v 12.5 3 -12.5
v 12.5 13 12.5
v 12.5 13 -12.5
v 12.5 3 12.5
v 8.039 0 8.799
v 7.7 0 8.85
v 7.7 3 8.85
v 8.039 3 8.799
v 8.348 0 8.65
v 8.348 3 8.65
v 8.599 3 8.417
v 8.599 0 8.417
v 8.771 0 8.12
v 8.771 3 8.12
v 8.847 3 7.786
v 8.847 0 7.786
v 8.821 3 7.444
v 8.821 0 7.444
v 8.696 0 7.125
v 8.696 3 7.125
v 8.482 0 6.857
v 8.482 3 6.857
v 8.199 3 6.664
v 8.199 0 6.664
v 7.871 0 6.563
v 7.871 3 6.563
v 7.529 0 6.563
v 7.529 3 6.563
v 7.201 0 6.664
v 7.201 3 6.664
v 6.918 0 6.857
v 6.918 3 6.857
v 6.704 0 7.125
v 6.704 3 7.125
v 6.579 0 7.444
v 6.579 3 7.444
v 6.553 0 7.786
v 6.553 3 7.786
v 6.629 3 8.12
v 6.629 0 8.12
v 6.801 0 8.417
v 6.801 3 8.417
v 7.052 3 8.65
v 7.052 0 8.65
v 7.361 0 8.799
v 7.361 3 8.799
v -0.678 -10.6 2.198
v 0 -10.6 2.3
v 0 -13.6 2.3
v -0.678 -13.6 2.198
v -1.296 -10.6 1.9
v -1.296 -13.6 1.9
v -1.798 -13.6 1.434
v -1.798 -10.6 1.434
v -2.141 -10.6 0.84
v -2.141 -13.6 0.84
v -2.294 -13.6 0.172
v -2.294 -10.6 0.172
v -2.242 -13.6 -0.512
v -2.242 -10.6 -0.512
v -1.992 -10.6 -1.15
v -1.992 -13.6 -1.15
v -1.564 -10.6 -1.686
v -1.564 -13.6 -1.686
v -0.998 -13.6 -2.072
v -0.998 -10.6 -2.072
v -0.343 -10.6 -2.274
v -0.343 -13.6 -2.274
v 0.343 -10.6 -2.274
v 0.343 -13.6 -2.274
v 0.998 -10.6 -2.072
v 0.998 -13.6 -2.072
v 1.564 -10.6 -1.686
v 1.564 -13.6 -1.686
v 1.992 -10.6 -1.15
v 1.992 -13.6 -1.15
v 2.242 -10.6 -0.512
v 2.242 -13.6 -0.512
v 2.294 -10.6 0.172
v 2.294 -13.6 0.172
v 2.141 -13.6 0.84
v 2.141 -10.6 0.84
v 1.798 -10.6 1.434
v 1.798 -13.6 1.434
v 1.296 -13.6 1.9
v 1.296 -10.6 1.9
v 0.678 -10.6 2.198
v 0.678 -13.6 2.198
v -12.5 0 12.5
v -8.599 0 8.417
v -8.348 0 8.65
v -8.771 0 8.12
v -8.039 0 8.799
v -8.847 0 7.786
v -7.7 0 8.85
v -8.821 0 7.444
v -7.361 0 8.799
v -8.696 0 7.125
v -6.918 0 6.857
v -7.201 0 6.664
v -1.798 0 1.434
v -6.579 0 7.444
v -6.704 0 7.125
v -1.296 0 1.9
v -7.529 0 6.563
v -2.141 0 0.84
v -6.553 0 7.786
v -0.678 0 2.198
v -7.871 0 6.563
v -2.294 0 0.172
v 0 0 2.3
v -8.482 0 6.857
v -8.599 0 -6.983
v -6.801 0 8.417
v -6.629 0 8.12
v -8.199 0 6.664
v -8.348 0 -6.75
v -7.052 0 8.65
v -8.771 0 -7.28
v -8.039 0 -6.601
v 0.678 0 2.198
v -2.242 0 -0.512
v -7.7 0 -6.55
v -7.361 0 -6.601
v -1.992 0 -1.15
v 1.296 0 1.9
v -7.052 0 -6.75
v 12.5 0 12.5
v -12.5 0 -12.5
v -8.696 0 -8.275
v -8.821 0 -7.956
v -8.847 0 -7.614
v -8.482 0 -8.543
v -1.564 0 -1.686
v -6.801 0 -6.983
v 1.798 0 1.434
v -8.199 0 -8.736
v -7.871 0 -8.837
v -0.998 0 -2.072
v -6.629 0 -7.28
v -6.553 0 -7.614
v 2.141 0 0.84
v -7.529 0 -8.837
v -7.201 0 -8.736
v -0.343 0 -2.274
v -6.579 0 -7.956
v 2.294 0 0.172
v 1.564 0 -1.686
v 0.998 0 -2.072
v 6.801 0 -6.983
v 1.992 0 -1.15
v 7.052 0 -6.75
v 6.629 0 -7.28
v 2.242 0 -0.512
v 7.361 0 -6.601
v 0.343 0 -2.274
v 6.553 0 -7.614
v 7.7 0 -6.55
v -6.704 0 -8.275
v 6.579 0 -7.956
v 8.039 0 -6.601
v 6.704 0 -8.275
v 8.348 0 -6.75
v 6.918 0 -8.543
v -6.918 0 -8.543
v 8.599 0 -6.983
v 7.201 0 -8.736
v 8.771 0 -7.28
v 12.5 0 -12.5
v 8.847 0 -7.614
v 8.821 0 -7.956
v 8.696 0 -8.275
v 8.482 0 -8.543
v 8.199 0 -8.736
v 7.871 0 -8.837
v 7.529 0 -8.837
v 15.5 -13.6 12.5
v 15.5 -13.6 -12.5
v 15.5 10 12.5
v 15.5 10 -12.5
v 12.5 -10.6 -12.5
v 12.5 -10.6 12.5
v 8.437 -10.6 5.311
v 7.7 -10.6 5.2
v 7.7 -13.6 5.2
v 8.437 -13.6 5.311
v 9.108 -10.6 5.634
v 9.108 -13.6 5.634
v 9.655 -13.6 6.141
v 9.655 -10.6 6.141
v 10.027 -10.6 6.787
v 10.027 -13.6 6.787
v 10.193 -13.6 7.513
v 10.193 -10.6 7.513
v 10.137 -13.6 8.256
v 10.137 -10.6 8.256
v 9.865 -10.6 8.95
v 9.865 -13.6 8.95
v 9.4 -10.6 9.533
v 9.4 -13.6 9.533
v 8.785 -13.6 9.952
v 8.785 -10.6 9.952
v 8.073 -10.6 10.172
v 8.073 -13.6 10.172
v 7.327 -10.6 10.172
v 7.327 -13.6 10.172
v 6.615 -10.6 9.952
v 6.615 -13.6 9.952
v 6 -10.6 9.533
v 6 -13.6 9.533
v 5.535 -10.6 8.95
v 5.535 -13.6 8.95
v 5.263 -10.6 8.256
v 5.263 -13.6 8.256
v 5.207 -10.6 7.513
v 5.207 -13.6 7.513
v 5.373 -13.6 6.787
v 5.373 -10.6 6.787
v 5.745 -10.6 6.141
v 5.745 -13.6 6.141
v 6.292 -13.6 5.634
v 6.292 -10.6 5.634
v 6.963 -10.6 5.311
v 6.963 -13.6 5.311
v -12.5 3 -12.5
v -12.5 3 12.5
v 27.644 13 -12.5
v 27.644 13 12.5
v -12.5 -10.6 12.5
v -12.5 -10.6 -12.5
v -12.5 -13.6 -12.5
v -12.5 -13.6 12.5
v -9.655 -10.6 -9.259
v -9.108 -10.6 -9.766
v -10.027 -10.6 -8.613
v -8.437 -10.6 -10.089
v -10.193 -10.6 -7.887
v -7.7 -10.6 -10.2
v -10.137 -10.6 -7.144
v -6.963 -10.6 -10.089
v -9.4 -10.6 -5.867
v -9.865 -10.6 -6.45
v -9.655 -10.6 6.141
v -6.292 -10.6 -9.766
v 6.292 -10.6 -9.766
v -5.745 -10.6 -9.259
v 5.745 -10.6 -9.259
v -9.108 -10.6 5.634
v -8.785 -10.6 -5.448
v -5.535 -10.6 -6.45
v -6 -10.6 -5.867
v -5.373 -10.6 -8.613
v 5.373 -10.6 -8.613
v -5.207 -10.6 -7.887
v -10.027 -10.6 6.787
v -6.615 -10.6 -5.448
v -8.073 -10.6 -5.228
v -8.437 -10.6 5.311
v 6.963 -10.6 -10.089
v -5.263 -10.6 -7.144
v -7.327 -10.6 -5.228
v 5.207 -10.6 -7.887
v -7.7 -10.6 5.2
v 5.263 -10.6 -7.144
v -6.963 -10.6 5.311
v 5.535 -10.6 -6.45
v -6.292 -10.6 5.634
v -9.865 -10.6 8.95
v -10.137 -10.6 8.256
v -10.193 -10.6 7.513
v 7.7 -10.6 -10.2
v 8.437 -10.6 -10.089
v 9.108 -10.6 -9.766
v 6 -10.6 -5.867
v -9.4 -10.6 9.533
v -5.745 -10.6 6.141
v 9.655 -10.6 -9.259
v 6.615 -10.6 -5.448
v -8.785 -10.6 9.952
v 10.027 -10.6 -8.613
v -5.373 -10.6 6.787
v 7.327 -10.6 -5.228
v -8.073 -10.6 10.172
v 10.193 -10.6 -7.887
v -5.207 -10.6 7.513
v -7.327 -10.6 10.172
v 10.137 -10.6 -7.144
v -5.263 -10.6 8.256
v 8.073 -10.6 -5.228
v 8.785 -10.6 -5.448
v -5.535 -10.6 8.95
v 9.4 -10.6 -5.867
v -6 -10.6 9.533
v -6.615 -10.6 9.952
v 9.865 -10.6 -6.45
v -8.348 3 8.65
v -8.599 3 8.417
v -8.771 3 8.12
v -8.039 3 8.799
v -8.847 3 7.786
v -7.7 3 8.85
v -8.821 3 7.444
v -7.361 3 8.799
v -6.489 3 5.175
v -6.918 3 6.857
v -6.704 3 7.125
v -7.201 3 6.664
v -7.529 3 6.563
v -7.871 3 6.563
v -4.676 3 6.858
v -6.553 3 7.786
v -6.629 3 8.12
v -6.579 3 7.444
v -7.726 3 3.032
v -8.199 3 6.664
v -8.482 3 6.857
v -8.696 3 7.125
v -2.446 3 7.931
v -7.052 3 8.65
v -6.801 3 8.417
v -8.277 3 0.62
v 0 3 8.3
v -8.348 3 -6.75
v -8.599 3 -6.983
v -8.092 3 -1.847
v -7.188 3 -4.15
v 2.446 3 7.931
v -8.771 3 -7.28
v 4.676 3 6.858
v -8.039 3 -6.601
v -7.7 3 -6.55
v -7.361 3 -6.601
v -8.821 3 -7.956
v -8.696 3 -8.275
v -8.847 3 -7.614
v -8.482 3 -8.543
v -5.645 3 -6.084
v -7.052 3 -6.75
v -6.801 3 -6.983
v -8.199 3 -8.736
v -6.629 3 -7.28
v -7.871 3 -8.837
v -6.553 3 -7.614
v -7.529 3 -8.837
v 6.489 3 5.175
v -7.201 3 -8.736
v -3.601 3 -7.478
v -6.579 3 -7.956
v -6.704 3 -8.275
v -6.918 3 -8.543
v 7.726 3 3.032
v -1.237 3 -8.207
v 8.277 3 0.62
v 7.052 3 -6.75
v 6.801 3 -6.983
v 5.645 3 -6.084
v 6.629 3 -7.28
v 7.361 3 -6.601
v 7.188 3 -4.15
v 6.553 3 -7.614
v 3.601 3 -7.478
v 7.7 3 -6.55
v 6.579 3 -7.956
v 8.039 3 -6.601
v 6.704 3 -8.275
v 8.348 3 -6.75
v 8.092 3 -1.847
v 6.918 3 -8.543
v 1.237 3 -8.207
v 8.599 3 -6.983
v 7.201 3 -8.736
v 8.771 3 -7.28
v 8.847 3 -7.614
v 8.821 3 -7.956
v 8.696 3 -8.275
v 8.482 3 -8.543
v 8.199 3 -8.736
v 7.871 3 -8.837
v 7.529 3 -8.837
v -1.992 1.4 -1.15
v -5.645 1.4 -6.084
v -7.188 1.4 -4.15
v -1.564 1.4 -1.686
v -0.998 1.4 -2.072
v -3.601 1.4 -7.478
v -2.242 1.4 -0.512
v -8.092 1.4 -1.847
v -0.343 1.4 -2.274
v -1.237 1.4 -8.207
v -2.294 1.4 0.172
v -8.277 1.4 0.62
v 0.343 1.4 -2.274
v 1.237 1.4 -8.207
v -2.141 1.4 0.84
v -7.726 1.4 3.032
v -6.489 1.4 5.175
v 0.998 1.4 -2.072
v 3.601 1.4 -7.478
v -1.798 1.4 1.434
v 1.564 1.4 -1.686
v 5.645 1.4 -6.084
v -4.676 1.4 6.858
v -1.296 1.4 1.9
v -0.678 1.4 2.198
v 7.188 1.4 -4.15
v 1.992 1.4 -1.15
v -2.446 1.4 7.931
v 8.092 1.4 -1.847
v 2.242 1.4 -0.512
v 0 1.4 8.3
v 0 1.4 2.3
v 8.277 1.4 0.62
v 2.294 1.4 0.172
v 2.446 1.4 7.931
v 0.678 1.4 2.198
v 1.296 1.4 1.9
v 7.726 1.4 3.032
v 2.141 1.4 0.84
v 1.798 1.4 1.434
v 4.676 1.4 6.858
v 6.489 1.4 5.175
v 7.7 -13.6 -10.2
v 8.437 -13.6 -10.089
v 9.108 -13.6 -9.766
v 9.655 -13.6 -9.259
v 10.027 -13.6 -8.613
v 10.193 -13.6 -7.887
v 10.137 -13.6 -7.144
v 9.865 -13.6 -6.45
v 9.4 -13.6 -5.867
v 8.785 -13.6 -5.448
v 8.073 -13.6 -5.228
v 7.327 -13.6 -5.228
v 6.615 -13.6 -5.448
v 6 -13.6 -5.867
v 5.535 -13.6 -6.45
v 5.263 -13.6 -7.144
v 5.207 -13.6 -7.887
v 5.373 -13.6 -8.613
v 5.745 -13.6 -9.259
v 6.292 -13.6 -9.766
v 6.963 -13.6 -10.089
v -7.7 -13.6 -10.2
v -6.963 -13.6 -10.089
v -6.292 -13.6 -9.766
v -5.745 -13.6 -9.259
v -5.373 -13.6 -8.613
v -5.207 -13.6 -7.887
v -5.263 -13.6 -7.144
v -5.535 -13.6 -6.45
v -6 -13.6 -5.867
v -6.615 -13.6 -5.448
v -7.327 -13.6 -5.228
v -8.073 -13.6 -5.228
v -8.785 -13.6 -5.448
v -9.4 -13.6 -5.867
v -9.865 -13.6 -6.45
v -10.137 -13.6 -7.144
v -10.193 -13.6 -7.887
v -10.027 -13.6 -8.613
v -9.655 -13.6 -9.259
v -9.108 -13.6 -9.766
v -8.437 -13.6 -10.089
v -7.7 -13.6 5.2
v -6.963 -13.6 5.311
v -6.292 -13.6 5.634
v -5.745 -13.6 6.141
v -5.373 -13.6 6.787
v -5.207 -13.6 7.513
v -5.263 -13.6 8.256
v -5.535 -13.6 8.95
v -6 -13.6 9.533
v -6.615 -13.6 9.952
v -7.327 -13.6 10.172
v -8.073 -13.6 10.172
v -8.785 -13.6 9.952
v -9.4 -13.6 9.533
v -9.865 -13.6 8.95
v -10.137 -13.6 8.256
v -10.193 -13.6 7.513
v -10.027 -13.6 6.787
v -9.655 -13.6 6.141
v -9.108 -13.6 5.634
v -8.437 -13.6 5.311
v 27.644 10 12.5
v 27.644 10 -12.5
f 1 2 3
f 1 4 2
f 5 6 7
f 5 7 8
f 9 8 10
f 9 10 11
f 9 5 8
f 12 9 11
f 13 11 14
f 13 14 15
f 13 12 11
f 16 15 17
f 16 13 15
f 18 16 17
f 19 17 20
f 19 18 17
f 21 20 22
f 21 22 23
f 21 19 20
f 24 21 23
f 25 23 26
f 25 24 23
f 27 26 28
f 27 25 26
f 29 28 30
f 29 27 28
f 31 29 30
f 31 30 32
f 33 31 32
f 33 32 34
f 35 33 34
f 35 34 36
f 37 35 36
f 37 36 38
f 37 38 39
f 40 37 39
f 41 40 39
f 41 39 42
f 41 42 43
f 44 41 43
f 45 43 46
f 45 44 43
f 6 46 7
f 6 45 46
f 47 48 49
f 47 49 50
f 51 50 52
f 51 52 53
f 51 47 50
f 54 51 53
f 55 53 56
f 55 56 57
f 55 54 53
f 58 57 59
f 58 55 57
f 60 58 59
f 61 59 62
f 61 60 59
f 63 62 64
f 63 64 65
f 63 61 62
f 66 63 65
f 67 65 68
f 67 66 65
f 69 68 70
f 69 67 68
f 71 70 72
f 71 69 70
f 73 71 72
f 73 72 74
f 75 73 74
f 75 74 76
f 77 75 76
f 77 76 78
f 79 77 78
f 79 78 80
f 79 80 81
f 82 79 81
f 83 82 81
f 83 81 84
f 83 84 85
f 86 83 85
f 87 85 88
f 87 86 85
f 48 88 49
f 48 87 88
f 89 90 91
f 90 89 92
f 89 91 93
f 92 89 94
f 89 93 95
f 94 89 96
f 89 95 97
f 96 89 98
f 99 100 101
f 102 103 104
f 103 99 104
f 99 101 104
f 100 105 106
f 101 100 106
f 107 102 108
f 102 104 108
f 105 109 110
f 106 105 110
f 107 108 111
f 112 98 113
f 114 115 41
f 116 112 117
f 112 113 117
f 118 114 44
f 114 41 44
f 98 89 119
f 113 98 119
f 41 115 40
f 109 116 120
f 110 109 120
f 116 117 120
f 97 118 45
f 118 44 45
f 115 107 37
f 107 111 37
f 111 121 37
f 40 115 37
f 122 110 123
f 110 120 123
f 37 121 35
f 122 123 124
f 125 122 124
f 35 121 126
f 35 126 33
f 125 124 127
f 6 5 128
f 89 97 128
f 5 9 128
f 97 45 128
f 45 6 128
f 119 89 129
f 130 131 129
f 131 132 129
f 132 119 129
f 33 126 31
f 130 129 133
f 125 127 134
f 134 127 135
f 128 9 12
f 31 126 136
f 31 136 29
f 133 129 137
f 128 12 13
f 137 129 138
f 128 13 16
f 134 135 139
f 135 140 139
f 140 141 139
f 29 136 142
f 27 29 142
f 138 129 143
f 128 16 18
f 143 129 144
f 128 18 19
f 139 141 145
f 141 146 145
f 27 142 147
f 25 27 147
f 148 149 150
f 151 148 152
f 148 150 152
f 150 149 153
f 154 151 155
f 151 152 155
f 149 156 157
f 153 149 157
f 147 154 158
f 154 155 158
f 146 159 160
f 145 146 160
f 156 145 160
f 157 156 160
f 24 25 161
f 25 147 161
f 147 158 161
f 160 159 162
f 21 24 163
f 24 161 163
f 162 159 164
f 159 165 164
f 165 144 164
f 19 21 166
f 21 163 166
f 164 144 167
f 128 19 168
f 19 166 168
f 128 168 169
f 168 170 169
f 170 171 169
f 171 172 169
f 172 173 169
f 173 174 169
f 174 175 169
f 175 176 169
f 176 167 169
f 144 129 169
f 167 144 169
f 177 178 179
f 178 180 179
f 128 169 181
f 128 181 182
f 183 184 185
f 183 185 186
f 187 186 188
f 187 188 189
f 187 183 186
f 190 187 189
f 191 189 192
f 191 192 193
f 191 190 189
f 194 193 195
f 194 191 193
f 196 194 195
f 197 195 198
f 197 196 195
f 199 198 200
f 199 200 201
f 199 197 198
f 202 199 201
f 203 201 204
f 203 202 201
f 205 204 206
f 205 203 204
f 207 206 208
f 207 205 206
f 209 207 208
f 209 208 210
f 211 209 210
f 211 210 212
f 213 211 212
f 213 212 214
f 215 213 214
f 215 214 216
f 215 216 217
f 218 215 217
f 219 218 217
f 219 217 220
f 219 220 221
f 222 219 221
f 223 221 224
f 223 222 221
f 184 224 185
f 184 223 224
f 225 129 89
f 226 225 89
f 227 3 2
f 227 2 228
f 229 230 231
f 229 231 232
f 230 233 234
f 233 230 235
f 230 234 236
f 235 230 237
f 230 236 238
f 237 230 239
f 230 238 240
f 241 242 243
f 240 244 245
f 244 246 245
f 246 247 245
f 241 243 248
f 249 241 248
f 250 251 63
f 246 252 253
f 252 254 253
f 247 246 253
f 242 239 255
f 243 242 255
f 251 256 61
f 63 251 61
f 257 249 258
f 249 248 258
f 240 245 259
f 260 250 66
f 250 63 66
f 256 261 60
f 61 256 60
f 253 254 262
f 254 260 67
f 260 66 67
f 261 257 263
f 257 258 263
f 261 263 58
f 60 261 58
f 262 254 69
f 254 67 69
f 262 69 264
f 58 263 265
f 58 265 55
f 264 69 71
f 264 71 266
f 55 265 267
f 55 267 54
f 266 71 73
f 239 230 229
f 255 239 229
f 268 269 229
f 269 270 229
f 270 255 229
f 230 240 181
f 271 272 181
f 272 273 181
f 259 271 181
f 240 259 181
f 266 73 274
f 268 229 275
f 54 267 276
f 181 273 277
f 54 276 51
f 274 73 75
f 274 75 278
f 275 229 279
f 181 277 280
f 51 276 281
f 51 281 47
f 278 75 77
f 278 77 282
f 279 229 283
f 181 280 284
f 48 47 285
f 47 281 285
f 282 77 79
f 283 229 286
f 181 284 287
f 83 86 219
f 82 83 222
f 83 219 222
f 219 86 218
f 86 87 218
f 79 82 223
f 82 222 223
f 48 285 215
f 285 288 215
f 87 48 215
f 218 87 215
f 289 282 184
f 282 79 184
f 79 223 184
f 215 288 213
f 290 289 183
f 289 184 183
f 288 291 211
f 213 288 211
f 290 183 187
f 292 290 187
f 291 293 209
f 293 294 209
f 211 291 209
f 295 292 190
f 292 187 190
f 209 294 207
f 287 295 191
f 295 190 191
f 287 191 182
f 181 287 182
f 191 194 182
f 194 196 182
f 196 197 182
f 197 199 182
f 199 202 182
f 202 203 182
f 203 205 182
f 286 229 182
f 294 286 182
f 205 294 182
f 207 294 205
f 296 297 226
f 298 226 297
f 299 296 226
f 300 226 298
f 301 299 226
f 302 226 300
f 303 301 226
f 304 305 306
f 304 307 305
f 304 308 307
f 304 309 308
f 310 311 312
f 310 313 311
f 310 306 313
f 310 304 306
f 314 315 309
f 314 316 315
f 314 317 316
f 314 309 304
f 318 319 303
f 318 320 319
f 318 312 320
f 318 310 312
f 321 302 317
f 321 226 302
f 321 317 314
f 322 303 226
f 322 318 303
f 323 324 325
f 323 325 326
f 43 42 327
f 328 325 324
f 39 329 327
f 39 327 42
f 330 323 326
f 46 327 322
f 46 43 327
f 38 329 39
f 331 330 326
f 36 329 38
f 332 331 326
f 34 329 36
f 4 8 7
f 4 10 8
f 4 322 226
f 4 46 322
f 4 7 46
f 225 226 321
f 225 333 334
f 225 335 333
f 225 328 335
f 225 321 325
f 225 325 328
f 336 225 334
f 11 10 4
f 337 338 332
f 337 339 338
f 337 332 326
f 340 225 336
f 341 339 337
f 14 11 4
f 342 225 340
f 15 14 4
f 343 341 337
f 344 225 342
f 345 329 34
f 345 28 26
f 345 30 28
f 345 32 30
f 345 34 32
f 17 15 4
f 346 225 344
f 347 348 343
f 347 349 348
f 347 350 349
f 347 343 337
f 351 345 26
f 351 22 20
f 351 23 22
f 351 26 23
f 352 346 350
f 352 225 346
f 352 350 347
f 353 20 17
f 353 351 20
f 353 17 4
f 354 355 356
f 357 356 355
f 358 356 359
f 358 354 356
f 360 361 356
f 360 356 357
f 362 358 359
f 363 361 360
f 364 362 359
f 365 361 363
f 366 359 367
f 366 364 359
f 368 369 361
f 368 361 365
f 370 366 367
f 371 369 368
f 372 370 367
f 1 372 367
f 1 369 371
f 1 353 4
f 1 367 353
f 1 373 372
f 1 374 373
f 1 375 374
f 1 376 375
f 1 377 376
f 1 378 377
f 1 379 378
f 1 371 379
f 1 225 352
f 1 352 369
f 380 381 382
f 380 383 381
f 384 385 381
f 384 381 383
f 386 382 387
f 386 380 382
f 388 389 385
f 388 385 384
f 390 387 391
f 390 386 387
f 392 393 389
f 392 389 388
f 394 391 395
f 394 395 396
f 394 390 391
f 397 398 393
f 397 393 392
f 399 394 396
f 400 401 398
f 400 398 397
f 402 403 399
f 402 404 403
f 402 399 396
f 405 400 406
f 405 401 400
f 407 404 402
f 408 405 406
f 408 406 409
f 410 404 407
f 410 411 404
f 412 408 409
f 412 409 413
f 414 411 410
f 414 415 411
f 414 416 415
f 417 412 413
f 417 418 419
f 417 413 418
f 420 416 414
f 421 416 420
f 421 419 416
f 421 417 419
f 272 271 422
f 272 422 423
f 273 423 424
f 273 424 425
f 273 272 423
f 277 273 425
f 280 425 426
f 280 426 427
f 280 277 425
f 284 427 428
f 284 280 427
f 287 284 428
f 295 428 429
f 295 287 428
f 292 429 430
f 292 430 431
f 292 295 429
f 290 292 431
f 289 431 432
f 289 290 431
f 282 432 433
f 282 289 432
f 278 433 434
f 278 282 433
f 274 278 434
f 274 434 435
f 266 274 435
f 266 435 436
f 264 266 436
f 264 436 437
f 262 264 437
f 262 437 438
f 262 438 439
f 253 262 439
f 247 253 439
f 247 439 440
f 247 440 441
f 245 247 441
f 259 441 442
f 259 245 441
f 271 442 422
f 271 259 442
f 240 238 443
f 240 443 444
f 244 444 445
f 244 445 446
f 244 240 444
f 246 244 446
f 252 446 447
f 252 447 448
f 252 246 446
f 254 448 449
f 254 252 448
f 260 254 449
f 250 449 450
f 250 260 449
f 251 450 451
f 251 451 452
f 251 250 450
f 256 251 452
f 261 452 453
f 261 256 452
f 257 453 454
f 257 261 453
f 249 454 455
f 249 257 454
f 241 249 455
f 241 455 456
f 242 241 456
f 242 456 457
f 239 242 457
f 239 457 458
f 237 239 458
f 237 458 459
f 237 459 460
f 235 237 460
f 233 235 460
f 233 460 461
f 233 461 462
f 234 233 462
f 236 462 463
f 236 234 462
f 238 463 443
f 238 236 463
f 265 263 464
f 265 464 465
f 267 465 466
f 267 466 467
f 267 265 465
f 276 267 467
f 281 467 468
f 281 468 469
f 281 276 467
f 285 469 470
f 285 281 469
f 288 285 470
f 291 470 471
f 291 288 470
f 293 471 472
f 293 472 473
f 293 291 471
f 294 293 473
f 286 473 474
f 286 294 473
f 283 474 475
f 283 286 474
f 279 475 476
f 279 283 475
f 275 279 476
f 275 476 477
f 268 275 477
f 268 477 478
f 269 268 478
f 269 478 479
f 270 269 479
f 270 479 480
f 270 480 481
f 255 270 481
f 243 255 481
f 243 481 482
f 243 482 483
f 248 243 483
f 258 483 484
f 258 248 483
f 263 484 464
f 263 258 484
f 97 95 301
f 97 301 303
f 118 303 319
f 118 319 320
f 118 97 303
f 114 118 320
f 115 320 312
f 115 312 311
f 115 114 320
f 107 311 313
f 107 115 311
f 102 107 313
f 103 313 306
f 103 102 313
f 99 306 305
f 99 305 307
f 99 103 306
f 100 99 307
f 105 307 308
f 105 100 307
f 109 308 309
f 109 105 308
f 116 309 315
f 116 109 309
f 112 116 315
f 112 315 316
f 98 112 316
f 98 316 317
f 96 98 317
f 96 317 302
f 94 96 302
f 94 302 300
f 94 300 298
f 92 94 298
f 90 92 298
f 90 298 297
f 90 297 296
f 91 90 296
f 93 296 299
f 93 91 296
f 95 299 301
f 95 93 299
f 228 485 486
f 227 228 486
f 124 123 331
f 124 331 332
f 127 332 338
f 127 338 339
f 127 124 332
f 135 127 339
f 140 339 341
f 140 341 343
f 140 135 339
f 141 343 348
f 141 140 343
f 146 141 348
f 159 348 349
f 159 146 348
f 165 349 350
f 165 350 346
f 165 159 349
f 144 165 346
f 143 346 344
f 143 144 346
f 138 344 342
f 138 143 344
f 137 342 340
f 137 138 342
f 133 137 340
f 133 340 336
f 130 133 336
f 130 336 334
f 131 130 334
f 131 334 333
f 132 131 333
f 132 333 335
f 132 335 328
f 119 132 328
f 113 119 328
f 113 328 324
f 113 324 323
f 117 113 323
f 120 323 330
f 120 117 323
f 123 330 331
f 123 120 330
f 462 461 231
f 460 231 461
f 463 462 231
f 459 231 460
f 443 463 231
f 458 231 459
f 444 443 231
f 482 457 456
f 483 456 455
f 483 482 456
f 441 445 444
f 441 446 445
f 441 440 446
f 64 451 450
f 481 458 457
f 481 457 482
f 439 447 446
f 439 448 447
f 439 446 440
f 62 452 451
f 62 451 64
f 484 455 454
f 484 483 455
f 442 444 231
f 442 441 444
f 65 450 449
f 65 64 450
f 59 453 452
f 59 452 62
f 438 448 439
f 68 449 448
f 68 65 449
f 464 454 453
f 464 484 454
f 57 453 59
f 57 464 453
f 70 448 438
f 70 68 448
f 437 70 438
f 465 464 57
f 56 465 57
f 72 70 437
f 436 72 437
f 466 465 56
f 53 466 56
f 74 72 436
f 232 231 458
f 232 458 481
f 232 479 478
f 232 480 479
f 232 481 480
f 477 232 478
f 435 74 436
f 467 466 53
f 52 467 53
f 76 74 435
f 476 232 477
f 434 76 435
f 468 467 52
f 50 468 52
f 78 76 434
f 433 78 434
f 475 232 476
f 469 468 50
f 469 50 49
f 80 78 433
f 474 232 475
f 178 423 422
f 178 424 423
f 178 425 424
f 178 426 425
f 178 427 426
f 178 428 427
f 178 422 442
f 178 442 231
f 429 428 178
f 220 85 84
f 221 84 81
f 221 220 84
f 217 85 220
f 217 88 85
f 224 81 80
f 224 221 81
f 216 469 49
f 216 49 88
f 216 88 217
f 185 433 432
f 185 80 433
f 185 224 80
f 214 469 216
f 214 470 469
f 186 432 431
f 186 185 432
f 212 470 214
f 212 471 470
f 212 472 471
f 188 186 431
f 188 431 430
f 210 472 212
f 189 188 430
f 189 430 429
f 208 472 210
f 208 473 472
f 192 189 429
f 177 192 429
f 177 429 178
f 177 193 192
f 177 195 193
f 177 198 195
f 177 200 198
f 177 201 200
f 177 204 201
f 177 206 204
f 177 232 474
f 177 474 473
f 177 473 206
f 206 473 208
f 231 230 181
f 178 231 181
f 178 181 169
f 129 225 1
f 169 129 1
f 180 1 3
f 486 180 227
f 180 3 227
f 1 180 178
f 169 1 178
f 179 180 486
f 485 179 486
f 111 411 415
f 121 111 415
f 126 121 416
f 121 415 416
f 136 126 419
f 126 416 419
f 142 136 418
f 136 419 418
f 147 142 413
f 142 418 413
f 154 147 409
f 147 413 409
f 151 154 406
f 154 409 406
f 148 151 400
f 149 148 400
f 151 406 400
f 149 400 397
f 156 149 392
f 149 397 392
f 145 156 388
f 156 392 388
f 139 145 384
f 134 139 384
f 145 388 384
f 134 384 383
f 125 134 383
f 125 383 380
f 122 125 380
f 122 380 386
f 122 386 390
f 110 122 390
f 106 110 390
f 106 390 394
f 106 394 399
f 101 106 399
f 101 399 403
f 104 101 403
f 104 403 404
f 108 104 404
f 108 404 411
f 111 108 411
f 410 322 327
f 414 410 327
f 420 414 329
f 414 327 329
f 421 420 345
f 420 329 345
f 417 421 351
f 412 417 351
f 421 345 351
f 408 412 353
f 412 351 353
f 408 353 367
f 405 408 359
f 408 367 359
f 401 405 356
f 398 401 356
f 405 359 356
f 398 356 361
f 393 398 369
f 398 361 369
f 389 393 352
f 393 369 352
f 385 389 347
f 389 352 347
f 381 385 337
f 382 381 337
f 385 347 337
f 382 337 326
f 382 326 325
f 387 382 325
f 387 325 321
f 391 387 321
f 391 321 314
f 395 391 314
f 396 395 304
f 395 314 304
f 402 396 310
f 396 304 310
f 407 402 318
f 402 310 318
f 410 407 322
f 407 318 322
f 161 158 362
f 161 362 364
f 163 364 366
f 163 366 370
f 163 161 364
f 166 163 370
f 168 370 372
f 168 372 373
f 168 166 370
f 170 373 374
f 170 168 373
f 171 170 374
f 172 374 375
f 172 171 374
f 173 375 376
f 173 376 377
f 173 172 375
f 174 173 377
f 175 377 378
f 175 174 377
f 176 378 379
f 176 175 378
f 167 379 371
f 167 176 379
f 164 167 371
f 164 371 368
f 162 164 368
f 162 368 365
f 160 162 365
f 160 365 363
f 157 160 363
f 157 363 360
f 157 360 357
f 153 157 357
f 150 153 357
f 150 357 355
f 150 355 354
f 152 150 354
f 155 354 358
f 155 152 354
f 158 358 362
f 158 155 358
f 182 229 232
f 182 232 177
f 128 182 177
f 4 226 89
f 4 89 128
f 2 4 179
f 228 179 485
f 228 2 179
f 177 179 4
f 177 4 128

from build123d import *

# Parameters (mm, degrees)
SKETCH1_R           = 1.15
BOSS_EXTRUDE1_DEPTH = 3
SKETCH2_W           = 3
SKETCH2_H           = 25
BOSS_EXTRUDE2_DEPTH = 7
SKETCH3_W           = 15.143900966
SKETCH3_H           = 25
BOSS_EXTRUDE3_DEPTH = 3
SKETCH4_R           = 8.3
CUT_EXTRUDE1_DEPTH  = 1.6
SKETCH5_R           = 2.3
CUT_EXTRUDE2_DEPTH  = 33.480690581
SKETCH6_W           = 3
SKETCH6_H           = 25
BOSS_EXTRUDE4_DEPTH = 10.6
SKETCH7_W           = 28
SKETCH7_H           = 25
SKETCH7_R           = 2.3
SKETCH7_R_2         = 2.5
BOSS_EXTRUDE5_DEPTH = 3


with BuildPart() as part:
    # Sketch1 → Boss-Extrude1 (new body)
    with BuildSketch(Plane(origin=(0, 0, 0), x_dir=(1, 0, 0), z_dir=(0, 1, 0))):
        Polygon((12.5, 12.5), (-12.5, 12.5), (-12.5, -12.5), (12.5, -12.5), (15.5, -12.5), (15.5, 12.5), align=None)
        with Locations(Location((-7.7, 7.7, 0), (0, 0, 270))):
            Circle(SKETCH1_R, mode=Mode.SUBTRACT)
        with Locations(Location((-7.7, -7.7, 0), (0, 0, 270))):
            Circle(SKETCH1_R, mode=Mode.SUBTRACT)
        with Locations(Location((7.7, -7.7, 0), (0, 0, 270))):
            Circle(SKETCH1_R, mode=Mode.SUBTRACT)
        with Locations(Location((7.7, 7.7, 0), (0, 0, 270))):
            Circle(SKETCH1_R, mode=Mode.SUBTRACT)
    extrude(amount=BOSS_EXTRUDE1_DEPTH)

    # Sketch2 → Boss-Extrude2 (add)
    with BuildSketch(Plane(origin=(0, 3, 0), x_dir=(1, 0, 0), z_dir=(0, 1, 0))):
        with Locations((14, 0)):
            Rectangle(SKETCH2_W, SKETCH2_H)
    extrude(amount=BOSS_EXTRUDE2_DEPTH)

    # Sketch3 → Boss-Extrude3 (add)
    with BuildSketch(Plane(origin=(0, 10, 0), x_dir=(1, 0, 0), z_dir=(0, 1, 0))):
        with Locations((20.071950483, 0)):
            Rectangle(SKETCH3_W, SKETCH3_H)
    extrude(amount=BOSS_EXTRUDE3_DEPTH)

    # Sketch4 → Cut-Extrude1 (cut)
    with BuildSketch(Plane(origin=(0, 3, 0), x_dir=(1, 0, 0), z_dir=(0, 1, 0))):
        with Locations(Location((0, 0, 0), (0, 0, 270))):
            Circle(SKETCH4_R)
    extrude(amount=-CUT_EXTRUDE1_DEPTH, mode=Mode.SUBTRACT)

    # Sketch5 → Cut-Extrude2 (cut, through all)
    with BuildSketch(Plane(origin=(0, 1.4, 0), x_dir=(1, 0, 0), z_dir=(0, 1, 0))):
        with Locations(Location((0, 0, 0), (0, 0, 270))):
            Circle(SKETCH5_R)
    extrude(amount=-CUT_EXTRUDE2_DEPTH, mode=Mode.SUBTRACT)

    # Sketch6 → Boss-Extrude4 (add)
    with BuildSketch(Plane.XZ):
        with Locations((14, 0)):
            Rectangle(SKETCH6_W, SKETCH6_H)
    extrude(amount=BOSS_EXTRUDE4_DEPTH)

    # Sketch7 → Boss-Extrude5 (add)
    with BuildSketch(Plane.XZ.offset(10.6)):
        with Locations((1.5, 0)):
            Rectangle(SKETCH7_W, SKETCH7_H)
        with Locations(Location((0, 0, 0), (0, 0, 90))):
            Circle(SKETCH7_R, mode=Mode.SUBTRACT)
        with Locations(Location((-7.7, 7.7, 0), (0, 0, 270))):
            Circle(SKETCH7_R_2, mode=Mode.SUBTRACT)
        with Locations(Location((-7.7, -7.7, 0), (0, 0, 270))):
            Circle(SKETCH7_R_2, mode=Mode.SUBTRACT)
        with Locations(Location((7.7, -7.7, 0), (0, 0, 270))):
            Circle(SKETCH7_R_2, mode=Mode.SUBTRACT)
        with Locations(Location((7.7, 7.7, 0), (0, 0, 270))):
            Circle(SKETCH7_R_2, mode=Mode.SUBTRACT)
    extrude(amount=BOSS_EXTRUDE5_DEPTH)


solid = part.part
